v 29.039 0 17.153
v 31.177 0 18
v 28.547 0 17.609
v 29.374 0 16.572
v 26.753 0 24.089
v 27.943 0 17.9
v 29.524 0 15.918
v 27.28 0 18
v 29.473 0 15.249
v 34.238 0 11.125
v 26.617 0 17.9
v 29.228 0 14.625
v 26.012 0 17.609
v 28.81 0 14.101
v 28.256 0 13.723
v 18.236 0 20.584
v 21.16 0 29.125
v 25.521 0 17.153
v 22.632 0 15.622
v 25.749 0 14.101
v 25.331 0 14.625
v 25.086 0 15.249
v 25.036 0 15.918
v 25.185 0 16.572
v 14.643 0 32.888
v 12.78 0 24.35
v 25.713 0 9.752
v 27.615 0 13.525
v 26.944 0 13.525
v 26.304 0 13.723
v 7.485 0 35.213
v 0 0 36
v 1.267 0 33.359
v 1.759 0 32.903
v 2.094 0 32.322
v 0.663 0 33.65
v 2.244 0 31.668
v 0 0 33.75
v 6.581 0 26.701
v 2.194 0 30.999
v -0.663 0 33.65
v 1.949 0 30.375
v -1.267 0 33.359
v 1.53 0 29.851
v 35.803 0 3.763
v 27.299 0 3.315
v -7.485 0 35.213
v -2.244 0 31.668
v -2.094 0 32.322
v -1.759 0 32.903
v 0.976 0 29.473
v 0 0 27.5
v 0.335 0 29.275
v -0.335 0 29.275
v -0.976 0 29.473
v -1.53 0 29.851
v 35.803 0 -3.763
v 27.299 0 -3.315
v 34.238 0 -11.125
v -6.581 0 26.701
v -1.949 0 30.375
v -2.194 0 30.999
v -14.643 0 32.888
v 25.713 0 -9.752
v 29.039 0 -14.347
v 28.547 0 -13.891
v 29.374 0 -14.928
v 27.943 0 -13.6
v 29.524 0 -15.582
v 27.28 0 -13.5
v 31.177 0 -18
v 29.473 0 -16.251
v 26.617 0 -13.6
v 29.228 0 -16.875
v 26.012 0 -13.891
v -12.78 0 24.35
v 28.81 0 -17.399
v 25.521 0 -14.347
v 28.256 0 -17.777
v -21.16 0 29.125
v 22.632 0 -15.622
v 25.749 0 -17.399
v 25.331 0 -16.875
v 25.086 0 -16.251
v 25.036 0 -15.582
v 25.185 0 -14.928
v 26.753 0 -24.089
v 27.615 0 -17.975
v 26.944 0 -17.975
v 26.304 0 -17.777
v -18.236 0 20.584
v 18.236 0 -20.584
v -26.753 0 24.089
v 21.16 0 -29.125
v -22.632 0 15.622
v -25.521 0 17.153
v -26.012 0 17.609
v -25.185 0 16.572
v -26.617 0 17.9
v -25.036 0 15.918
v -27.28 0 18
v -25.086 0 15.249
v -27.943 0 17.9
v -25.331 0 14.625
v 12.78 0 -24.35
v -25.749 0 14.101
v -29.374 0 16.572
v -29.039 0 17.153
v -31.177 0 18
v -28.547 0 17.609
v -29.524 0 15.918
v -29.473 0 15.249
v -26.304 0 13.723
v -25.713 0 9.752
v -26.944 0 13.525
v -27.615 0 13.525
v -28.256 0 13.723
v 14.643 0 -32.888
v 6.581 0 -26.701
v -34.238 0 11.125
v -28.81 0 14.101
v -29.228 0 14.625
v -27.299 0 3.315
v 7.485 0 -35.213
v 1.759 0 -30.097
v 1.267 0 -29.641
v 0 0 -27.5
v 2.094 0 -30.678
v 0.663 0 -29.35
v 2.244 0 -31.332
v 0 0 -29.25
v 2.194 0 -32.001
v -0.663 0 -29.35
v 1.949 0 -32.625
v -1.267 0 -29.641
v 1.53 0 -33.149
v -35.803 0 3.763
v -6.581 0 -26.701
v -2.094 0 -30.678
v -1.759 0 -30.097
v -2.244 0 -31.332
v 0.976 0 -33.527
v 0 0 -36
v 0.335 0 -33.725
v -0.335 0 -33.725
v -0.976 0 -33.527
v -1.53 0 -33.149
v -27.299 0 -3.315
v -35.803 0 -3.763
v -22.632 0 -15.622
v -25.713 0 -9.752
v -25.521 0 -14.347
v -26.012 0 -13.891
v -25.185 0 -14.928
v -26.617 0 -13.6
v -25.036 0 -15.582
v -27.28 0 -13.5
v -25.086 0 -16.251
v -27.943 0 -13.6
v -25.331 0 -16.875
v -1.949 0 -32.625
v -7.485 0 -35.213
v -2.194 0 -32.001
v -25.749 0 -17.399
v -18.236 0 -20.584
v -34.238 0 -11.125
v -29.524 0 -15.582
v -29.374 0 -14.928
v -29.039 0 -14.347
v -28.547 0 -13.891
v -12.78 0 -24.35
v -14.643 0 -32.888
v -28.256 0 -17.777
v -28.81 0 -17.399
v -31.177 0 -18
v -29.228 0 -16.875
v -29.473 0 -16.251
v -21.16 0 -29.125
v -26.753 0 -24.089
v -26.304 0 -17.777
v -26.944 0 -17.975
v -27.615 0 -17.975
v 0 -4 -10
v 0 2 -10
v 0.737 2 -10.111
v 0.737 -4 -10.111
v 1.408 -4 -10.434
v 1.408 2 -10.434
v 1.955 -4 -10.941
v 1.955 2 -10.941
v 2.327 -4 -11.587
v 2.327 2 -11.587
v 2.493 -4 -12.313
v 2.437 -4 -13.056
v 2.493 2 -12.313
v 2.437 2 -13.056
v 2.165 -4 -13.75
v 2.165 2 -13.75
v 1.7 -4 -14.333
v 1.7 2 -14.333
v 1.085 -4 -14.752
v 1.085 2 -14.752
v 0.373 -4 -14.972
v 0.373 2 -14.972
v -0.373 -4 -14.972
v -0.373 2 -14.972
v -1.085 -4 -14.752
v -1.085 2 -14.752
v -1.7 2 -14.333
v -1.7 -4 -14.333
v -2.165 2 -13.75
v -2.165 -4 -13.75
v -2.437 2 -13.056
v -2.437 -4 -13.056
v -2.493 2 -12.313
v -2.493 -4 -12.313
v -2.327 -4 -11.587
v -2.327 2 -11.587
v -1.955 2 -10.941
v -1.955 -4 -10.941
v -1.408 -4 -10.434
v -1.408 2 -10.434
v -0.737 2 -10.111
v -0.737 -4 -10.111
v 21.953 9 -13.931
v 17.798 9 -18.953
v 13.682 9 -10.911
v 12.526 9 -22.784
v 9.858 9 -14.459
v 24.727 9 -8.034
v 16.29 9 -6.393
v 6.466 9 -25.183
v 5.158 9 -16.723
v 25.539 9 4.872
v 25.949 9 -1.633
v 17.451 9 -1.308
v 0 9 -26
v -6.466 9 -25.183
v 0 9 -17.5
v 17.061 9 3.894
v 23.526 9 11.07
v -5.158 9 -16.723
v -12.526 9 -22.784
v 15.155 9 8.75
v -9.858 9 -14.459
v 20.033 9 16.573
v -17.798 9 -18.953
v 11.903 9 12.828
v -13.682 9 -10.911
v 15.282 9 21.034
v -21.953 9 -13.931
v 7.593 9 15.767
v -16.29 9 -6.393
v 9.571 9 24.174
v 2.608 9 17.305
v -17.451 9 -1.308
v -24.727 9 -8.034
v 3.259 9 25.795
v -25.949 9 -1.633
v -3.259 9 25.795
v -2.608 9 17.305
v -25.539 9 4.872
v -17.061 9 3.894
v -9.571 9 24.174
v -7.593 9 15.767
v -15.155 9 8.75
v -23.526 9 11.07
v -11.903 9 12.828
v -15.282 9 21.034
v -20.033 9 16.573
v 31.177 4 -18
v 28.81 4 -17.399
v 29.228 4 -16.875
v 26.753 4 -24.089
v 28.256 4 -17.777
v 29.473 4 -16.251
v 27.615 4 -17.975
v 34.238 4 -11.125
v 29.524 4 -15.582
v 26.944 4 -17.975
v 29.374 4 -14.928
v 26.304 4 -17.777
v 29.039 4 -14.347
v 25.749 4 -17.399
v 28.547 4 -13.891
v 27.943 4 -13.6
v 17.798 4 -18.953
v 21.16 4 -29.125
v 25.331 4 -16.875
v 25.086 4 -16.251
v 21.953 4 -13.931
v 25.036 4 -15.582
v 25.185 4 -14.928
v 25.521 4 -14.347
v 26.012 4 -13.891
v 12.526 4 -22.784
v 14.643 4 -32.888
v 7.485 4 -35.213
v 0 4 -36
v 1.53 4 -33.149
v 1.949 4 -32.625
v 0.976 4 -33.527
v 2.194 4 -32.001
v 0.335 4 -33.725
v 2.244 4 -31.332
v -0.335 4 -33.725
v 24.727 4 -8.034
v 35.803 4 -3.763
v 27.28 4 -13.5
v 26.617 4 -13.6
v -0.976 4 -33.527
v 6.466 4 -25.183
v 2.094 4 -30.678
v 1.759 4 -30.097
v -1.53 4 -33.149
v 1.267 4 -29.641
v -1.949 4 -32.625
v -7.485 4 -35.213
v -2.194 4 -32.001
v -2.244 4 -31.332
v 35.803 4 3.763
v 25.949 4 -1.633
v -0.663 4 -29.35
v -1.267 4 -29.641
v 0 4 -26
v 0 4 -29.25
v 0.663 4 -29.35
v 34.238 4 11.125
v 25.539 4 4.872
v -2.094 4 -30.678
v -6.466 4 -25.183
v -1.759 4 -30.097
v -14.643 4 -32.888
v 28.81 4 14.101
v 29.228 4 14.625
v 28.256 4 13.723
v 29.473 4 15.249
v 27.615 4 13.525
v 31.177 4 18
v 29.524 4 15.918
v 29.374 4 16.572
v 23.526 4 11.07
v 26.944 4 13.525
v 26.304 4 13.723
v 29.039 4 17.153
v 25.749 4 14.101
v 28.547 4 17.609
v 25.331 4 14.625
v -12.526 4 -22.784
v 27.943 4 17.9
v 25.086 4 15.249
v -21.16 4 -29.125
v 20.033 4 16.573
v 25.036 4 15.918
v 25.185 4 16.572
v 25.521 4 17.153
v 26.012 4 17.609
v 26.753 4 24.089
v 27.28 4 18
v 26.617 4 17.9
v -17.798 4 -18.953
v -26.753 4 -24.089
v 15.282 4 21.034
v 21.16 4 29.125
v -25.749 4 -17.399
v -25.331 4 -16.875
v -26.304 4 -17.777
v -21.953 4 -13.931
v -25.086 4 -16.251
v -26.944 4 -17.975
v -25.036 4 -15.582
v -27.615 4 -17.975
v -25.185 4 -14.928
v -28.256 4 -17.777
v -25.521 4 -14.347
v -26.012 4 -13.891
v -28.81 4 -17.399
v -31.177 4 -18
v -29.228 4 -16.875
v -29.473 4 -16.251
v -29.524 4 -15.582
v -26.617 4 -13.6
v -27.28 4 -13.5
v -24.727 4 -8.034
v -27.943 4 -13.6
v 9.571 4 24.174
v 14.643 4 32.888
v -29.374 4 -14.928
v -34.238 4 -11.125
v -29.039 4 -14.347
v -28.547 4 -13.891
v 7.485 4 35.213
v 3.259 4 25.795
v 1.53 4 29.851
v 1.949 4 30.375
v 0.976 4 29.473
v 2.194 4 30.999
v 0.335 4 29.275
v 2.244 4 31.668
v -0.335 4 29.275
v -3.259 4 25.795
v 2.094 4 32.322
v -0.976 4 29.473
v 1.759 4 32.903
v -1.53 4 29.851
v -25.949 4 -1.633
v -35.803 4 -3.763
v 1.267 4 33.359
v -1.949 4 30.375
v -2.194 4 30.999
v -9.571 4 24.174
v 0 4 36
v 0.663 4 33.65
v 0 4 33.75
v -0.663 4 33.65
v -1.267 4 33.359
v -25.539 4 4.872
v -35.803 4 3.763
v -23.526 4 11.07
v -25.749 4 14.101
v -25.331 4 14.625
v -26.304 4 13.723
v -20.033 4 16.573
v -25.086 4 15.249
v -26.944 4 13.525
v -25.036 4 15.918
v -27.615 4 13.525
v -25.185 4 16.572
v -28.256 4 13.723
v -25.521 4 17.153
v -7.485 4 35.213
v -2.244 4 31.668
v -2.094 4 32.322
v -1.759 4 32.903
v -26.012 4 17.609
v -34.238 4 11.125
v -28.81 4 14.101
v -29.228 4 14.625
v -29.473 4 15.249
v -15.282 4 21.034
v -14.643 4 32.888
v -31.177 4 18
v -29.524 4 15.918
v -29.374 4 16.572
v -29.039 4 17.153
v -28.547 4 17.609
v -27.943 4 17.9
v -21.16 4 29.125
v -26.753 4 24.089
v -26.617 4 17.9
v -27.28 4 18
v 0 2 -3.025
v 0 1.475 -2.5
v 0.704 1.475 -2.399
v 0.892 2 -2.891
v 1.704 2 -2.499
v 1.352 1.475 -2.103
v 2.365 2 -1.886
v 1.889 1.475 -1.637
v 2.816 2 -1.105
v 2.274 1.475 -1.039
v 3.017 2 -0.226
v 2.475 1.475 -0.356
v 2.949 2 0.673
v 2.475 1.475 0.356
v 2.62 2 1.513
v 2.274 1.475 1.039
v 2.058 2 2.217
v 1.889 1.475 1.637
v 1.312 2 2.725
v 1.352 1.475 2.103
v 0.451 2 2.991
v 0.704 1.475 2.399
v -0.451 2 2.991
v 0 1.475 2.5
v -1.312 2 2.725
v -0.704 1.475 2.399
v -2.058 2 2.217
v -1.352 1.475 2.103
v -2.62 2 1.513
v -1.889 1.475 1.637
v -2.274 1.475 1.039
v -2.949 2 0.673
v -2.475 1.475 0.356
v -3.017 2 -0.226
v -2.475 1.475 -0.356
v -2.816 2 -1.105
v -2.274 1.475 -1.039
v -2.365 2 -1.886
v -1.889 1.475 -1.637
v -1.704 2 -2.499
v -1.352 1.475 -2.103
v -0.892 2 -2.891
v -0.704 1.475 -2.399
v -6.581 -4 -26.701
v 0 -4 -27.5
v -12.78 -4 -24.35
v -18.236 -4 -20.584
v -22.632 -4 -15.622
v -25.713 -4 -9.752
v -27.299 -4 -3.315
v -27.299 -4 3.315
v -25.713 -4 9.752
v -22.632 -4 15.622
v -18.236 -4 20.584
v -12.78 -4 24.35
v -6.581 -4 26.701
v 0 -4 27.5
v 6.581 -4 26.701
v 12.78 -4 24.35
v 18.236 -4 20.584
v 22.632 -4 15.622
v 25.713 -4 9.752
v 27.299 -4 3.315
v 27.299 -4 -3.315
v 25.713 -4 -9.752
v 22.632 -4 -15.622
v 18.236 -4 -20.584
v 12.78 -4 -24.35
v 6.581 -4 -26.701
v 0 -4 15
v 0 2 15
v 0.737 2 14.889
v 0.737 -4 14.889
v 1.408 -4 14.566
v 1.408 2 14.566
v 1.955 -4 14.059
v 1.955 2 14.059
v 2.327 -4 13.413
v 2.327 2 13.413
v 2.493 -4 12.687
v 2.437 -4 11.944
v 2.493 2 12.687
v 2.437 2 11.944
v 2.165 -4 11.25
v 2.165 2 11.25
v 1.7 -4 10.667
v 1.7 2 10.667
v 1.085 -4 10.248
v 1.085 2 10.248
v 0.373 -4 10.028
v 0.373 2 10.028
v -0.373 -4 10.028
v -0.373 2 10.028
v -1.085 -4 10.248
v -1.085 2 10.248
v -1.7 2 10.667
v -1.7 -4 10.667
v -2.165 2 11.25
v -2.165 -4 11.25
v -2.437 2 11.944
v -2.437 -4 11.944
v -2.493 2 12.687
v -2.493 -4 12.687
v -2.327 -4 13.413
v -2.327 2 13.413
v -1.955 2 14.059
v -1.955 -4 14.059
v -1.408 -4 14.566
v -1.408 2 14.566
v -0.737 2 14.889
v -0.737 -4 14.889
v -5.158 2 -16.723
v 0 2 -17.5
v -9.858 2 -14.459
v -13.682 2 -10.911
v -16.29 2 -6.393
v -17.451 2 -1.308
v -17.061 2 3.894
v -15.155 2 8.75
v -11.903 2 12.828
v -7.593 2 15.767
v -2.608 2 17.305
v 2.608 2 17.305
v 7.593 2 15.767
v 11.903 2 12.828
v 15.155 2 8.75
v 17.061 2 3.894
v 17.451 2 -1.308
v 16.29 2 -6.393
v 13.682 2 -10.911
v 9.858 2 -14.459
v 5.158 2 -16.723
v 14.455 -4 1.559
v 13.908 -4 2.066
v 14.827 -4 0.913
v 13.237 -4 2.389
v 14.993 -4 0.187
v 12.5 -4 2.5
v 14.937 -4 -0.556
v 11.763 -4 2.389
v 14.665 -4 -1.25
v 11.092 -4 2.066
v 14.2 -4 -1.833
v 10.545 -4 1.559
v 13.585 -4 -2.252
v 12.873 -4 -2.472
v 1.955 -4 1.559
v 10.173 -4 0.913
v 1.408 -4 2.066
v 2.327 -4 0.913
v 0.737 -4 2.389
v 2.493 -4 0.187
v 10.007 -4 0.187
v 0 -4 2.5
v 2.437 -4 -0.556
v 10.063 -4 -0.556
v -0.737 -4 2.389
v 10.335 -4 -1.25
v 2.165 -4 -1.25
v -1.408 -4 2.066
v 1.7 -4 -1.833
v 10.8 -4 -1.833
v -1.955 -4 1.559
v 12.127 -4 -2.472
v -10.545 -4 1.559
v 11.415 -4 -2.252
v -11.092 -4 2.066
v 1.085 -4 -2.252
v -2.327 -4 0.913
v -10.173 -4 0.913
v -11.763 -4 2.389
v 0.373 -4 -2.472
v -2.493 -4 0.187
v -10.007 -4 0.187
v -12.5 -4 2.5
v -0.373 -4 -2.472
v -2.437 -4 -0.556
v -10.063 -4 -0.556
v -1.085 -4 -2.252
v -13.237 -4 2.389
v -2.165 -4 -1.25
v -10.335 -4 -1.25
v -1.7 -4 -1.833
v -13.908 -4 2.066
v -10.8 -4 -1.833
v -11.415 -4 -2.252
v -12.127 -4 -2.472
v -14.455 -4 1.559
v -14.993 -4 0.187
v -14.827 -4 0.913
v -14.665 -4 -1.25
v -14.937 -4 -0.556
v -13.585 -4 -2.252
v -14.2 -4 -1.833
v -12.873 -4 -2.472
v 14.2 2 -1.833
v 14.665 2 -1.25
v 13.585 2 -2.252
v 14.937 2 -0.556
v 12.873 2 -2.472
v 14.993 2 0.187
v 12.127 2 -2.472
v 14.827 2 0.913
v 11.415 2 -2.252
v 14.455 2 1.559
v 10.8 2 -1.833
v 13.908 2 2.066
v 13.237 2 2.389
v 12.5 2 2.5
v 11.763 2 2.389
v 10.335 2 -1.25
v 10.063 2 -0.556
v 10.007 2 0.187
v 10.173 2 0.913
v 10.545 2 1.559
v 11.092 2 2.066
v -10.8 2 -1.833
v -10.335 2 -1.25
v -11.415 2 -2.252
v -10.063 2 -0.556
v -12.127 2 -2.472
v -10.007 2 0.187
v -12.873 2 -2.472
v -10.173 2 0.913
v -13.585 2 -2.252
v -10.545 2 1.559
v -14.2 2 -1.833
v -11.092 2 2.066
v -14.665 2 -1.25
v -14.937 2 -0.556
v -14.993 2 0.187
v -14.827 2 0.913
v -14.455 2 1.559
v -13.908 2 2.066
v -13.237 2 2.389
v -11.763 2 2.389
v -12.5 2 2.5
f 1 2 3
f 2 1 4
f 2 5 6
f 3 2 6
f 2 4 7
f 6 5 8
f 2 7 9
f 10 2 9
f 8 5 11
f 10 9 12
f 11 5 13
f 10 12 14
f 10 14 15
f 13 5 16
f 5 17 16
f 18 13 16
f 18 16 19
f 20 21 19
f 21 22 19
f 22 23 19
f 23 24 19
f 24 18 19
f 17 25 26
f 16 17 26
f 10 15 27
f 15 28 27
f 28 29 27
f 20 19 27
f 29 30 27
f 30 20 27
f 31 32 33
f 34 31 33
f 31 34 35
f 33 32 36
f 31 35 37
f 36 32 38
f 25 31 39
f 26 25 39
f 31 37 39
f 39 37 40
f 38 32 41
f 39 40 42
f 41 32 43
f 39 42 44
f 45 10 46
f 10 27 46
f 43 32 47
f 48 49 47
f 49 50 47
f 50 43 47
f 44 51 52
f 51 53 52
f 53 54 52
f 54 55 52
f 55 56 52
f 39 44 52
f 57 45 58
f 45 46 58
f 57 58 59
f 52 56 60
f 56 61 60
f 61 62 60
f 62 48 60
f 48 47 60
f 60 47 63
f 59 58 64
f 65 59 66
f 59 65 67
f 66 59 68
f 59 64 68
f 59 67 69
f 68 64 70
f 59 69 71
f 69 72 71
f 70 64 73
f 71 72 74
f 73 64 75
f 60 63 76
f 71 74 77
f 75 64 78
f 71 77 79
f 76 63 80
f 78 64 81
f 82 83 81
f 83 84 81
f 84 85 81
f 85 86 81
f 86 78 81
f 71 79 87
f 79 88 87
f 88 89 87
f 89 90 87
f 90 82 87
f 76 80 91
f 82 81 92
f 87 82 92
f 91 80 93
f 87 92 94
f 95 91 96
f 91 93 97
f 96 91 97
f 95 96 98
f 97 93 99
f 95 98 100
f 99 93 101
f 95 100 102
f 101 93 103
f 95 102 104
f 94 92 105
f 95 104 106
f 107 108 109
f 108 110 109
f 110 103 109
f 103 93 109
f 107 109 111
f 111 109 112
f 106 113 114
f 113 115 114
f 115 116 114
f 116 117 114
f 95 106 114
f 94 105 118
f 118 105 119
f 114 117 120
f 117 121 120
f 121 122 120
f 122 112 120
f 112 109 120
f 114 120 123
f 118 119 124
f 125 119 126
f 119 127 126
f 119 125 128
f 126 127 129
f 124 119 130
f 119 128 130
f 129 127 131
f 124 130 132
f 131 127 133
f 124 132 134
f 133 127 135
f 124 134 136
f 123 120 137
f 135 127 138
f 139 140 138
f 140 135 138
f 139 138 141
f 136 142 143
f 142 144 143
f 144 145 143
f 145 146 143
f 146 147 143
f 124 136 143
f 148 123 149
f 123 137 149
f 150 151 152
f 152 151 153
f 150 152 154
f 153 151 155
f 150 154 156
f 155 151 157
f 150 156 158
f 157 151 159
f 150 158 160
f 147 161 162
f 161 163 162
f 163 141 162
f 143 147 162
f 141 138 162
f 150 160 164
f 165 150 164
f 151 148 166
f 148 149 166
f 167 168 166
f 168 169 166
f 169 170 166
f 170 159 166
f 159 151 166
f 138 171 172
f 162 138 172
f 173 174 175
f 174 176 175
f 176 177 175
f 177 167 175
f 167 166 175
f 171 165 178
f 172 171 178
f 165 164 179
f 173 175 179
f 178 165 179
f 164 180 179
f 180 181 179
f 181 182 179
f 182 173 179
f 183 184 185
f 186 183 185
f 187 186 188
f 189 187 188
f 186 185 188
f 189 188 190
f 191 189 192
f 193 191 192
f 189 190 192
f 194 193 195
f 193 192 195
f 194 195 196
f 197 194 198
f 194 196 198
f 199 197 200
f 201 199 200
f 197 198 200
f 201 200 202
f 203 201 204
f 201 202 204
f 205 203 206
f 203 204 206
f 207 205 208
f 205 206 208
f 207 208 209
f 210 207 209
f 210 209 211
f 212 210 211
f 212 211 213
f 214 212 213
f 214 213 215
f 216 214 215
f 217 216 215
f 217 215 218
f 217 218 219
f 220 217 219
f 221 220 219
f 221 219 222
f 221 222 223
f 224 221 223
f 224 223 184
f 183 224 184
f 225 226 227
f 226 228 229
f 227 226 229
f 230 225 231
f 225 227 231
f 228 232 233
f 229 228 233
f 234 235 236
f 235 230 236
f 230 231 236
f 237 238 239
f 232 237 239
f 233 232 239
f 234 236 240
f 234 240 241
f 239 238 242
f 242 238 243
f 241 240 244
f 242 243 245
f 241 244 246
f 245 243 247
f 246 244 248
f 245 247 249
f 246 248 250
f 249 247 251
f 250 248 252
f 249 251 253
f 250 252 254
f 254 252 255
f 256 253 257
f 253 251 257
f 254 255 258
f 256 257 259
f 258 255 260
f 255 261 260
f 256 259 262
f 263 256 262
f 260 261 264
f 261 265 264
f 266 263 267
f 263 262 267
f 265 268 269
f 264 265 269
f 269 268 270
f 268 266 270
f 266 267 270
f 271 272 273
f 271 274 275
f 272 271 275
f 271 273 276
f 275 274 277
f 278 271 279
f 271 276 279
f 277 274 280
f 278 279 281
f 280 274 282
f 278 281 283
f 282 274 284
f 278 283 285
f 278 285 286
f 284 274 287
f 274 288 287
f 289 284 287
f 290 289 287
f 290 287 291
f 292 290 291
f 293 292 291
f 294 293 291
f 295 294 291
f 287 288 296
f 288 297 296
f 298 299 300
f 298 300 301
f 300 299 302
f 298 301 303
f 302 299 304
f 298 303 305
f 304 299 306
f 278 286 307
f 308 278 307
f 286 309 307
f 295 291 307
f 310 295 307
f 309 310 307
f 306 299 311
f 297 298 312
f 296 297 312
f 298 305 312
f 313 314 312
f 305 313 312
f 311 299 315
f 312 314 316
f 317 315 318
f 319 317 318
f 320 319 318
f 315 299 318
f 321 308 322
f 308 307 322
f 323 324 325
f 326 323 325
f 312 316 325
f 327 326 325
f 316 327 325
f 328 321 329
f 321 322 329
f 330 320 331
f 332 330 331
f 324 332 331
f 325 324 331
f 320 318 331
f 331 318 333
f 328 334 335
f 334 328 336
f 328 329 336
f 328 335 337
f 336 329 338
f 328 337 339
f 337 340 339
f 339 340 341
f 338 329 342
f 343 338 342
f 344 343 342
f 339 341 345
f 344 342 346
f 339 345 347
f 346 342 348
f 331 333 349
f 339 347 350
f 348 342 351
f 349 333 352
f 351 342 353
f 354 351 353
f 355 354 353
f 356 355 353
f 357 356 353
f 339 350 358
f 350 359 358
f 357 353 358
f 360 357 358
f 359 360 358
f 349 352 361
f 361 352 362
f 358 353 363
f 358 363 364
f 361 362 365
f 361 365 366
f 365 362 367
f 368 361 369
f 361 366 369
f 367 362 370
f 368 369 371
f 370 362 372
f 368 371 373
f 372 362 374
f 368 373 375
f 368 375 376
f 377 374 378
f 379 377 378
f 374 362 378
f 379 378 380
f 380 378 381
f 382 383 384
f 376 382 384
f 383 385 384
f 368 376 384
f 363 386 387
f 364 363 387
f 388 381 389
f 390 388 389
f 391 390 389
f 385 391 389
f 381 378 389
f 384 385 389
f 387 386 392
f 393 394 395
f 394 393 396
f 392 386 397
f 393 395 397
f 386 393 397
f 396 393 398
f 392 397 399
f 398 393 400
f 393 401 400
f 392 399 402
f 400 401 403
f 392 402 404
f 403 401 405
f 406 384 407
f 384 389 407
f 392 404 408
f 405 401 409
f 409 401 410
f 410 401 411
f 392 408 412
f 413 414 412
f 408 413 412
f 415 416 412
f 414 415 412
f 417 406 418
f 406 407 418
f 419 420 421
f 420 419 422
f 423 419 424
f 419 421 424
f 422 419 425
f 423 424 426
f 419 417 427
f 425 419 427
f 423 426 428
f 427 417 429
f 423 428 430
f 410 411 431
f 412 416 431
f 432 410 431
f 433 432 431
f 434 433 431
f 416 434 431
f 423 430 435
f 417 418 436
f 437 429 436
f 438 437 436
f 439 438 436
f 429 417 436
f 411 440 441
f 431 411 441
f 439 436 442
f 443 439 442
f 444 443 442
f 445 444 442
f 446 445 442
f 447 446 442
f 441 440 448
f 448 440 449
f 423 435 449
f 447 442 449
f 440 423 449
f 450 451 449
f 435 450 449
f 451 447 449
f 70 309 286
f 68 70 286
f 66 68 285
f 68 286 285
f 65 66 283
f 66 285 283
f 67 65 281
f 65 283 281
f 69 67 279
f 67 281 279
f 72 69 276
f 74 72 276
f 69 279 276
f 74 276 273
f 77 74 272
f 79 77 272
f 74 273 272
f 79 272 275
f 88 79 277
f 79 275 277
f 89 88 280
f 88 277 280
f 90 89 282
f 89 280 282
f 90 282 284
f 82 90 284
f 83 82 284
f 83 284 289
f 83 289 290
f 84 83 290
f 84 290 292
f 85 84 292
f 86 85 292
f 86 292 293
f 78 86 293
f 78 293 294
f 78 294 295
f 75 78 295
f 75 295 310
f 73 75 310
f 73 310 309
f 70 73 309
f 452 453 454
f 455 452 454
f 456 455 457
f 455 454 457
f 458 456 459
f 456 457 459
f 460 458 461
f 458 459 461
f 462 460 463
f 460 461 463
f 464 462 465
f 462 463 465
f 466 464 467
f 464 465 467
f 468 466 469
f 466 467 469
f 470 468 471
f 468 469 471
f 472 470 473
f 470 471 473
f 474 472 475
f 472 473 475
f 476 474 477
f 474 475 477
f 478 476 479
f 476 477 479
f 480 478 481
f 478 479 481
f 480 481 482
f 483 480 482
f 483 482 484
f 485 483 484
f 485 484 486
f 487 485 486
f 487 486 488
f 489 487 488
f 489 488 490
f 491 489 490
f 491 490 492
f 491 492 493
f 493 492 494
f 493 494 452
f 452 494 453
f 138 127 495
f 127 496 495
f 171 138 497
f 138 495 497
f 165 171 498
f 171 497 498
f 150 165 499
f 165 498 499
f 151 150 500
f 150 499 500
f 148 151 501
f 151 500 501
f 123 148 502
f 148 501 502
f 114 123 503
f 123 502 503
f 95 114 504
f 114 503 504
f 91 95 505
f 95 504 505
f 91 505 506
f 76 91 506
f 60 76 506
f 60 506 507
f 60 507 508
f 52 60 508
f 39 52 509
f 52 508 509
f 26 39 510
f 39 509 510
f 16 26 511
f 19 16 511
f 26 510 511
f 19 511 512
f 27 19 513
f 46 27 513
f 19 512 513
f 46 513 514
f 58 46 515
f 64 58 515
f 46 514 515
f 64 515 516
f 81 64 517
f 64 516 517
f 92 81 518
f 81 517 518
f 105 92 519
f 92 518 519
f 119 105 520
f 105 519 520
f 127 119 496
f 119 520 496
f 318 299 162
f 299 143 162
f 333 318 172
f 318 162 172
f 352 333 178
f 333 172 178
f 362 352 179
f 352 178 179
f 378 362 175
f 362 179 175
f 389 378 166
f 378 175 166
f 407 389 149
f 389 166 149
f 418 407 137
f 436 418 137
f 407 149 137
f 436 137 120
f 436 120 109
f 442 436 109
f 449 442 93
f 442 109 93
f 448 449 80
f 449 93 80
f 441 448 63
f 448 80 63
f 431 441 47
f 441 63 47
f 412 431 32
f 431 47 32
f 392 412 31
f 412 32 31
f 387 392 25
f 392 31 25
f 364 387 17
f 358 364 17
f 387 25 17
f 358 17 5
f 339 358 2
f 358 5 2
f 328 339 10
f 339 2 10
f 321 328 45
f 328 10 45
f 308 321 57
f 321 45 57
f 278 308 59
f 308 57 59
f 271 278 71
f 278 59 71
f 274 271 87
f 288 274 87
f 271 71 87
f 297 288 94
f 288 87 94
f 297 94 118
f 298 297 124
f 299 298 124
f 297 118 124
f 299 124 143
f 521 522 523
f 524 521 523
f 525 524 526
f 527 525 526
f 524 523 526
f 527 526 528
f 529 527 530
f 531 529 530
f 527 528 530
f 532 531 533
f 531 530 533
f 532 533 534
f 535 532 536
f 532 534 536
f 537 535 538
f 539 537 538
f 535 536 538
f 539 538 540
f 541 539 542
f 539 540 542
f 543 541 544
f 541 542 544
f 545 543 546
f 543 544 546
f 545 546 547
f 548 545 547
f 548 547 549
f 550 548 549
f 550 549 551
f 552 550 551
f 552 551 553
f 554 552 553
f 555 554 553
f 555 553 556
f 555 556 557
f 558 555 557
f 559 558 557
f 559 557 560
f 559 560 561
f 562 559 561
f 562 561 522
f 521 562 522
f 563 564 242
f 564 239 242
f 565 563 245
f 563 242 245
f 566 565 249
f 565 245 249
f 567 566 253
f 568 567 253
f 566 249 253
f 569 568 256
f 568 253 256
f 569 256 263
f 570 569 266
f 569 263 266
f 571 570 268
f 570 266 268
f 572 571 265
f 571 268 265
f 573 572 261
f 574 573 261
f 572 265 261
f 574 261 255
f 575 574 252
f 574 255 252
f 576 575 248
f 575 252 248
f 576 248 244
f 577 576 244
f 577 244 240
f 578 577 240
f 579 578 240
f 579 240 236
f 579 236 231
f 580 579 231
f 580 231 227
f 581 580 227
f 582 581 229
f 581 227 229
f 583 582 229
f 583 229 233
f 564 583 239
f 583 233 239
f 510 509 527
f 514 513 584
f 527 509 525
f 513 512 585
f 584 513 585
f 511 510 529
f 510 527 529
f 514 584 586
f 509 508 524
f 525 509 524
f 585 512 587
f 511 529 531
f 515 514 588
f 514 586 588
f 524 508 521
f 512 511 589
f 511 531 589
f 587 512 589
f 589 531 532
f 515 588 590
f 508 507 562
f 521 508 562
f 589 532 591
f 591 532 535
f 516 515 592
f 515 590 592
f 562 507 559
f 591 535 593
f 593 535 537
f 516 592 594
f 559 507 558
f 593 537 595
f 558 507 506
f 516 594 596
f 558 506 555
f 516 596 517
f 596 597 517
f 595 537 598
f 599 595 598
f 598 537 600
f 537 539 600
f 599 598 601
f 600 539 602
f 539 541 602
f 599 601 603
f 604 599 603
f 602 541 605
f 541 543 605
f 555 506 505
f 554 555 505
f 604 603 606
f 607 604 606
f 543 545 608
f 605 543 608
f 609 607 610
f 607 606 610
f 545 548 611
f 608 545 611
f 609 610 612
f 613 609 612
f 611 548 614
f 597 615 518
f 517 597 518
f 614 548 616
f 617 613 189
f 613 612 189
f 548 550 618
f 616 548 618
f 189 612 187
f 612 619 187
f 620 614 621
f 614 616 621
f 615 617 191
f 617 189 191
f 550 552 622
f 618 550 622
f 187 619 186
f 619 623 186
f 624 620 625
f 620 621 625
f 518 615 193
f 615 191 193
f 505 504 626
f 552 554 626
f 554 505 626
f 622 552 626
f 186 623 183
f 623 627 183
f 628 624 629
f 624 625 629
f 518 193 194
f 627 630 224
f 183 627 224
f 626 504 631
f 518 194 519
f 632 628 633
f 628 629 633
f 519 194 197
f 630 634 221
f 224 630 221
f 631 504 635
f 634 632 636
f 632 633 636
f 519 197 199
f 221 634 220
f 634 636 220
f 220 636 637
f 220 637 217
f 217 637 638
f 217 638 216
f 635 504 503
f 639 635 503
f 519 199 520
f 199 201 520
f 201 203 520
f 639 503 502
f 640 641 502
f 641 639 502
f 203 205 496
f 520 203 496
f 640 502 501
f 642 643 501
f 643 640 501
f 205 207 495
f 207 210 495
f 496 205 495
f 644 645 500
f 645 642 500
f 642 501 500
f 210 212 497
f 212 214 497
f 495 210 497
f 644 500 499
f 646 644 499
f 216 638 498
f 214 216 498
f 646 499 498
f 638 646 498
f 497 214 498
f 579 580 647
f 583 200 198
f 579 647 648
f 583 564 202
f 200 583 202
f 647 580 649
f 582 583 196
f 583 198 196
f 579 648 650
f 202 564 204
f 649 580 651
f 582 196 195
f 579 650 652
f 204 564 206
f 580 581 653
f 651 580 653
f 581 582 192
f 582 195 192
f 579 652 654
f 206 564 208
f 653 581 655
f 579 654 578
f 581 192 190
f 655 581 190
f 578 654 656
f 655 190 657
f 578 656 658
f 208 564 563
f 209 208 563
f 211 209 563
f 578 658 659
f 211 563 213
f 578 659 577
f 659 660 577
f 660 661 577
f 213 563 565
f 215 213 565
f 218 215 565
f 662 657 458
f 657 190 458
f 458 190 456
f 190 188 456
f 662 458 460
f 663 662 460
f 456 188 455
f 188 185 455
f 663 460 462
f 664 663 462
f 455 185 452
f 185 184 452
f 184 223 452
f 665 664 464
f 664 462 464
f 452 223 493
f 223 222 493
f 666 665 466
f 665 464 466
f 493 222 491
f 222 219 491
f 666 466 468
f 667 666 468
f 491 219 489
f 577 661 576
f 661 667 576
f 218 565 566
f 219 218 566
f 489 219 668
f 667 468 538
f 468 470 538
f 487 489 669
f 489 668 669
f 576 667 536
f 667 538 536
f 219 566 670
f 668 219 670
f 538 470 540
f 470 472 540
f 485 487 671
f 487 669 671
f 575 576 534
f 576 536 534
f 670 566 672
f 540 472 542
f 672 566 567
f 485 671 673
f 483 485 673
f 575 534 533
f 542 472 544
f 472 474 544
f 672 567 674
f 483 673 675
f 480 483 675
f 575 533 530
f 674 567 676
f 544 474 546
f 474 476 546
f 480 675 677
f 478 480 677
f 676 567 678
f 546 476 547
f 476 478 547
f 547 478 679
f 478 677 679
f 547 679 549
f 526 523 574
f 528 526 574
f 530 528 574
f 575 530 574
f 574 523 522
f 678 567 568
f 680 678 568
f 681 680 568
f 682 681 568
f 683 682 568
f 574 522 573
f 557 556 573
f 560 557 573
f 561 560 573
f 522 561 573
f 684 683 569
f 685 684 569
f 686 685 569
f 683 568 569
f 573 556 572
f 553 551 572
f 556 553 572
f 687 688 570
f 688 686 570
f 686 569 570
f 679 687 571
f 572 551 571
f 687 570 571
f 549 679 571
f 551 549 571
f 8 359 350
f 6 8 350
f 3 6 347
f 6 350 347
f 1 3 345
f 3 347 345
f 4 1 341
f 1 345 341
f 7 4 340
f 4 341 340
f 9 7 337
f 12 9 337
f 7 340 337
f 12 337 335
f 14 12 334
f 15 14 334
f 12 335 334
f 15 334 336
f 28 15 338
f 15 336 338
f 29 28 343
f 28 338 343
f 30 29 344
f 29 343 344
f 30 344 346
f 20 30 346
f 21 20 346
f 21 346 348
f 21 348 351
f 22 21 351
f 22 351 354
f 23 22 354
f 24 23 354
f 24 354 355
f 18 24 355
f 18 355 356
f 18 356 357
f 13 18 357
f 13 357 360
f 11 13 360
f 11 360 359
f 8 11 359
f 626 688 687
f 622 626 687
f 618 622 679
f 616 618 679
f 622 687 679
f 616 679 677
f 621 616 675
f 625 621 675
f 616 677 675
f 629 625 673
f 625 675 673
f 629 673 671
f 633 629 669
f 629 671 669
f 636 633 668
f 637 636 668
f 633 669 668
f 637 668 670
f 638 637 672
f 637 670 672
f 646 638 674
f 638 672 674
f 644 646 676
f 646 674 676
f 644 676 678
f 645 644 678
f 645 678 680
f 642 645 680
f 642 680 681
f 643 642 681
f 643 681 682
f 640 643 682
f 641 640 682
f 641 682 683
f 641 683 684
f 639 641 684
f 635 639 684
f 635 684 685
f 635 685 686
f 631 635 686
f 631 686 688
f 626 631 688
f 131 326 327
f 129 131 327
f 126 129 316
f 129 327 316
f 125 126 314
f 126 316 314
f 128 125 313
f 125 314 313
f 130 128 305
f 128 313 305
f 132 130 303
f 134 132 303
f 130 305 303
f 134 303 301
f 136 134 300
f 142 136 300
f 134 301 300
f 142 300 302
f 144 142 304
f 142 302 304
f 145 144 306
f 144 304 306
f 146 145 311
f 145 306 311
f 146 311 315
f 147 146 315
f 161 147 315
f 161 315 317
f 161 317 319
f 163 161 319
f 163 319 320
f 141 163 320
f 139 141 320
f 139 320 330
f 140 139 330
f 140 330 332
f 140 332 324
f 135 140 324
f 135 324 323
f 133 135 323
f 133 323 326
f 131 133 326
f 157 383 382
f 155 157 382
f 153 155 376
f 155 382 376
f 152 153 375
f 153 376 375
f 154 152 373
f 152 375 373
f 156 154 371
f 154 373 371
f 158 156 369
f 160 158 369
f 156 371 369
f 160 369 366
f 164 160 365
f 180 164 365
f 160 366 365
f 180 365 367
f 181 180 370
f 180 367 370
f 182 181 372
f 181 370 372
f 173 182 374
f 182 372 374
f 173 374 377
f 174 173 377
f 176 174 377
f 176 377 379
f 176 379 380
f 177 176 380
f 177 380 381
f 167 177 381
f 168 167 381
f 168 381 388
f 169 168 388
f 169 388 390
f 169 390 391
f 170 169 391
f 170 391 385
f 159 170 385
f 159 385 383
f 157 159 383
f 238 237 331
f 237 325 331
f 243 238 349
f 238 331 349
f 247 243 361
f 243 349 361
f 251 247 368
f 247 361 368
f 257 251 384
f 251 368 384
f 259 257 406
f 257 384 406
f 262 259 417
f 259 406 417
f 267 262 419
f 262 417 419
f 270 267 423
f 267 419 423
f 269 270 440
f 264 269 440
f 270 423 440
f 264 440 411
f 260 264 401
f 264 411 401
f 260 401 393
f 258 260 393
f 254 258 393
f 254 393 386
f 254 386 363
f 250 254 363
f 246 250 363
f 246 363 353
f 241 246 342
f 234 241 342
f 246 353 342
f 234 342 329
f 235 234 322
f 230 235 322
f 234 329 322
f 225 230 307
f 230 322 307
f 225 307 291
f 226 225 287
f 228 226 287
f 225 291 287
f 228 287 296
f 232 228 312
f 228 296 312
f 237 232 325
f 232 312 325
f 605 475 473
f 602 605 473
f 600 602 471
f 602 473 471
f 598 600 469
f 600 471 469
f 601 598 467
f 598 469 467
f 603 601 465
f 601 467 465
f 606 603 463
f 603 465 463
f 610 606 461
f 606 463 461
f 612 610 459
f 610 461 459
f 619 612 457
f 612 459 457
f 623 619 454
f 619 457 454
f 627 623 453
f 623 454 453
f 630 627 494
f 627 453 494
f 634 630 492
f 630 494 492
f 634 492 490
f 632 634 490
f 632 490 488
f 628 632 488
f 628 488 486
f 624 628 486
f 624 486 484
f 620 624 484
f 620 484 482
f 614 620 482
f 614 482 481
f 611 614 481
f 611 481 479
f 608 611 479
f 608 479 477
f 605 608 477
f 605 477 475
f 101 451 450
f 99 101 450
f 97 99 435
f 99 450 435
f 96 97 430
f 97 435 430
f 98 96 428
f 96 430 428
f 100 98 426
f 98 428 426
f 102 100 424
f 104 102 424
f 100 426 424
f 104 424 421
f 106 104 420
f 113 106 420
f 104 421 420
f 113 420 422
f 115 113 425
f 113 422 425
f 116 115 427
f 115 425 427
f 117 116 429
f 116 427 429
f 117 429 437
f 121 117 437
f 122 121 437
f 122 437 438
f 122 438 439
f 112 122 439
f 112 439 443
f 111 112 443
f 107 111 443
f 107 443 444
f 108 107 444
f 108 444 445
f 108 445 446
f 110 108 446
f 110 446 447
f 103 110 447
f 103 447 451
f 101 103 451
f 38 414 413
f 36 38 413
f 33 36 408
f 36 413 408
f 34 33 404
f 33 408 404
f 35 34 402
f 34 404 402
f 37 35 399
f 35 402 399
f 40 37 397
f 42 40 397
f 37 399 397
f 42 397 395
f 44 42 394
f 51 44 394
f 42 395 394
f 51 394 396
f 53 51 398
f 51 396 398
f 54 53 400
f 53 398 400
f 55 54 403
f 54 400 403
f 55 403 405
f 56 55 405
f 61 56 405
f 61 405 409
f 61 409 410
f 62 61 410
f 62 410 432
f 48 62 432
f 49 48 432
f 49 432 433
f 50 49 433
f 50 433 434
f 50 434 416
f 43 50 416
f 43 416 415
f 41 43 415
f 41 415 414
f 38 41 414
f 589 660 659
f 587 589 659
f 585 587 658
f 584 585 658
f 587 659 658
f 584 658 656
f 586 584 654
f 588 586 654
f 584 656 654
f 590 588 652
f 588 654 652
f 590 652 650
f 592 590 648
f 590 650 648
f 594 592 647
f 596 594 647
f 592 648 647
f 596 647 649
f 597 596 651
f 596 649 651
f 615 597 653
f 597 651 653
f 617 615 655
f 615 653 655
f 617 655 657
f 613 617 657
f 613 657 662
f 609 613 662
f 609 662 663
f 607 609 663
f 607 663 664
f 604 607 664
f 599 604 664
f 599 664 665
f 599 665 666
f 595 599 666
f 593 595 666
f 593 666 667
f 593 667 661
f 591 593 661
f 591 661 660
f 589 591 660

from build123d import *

# Parameters (mm, degrees)
SKETCH2_R                   = 2.25
CUT_EXTRUDE1_DEPTH          = 52.536394907
SKETCH4_R                   = 2.5
CUT_EXTRUDE3_DEPTH          = 10
M6_TAPPED_HOLE1_D           = 5
M6_TAPPED_HOLE1_DEPTH       = 15
M6_TAPPED_HOLE1_CSINK_D     = 6.05
M6_TAPPED_HOLE1_CSINK_ANGLE = 90
M6_TAPPED_HOLE1_TIP         = 1.502151548
SKETCH9_R                   = 2.5
CUT_EXTRUDE4_DEPTH          = 52.39066063
M6_TAPPED_HOLE2_D           = 5
M6_TAPPED_HOLE2_DEPTH       = 65
M6_TAPPED_HOLE2_CSINK_D     = 6.05
M6_TAPPED_HOLE2_CSINK_ANGLE = 90
M6_TAPPED_HOLE2_TIP         = 1.502151548


with BuildPart() as part:
    # Sketch1 → Revolve1 (revolve)
    with BuildSketch(Plane.XY, mode=Mode.PRIVATE) as revolve1_sk:
        Polygon((27.5, 0), (27.5, -4), (0, -4), (0, 2), (17.5, 2), (17.5, 9), (26, 9), (26, 4), (36, 4), (36, 0), align=None)
    revolve(revolve1_sk.sketch.rotate(Axis((0, 0, 0), (0, 1, 0)), 90), axis=Axis((0, 0, 0), (0, 1, 0)))

    # Sketch2 → Cut-Extrude1 (cut, through all)
    with BuildSketch(Plane(origin=(0, 4, 0), x_dir=(1, 0, 0), z_dir=(0, 1, 0))):
        with Locations(Location((0, 31.5, 0), (0, 0, 270))):
            Circle(SKETCH2_R)
        with Locations(Location((27.279800219, 15.75, 0), (0, 0, 270))):
            Circle(SKETCH2_R)
        with Locations(Location((27.279800219, -15.75, 0), (0, 0, 270))):
            Circle(SKETCH2_R)
        with Locations(Location((0, -31.5, 0), (0, 0, 270))):
            Circle(SKETCH2_R)
        with Locations(Location((-27.279800219, -15.75, 0), (0, 0, 270))):
            Circle(SKETCH2_R)
        with Locations(Location((-27.279800219, 15.75, 0), (0, 0, 270))):
            Circle(SKETCH2_R)
    extrude(amount=-CUT_EXTRUDE1_DEPTH, mode=Mode.SUBTRACT)

    # Sketch4 → Cut-Extrude3 (cut)
    with BuildSketch(Plane(origin=(0, 2, 0), x_dir=(1, 0, 0), z_dir=(0, 1, 0))):
        with Locations(Location((12.5, 0, 0), (0, 0, 270))):
            Circle(SKETCH4_R)
        with Locations(Location((0, -12.5, 0), (0, 0, 270))):
            Circle(SKETCH4_R)
        with Locations(Location((-12.5, 0, 0), (0, 0, 270))):
            Circle(SKETCH4_R)
        with Locations(Location((0, 12.5, 0), (0, 0, 270))):
            Circle(SKETCH4_R)
    extrude(amount=-CUT_EXTRUDE3_DEPTH, mode=Mode.SUBTRACT)

    # M6 Tapped Hole1
    with Locations(Plane(origin=(-12.5, 9, 0), x_dir=(0, 0, 1), z_dir=(0, 1, 0))):
        with Locations((0, 0), (0, 25), (-12.5, 12.5), (12.5, 12.5)):
            CounterSinkHole(M6_TAPPED_HOLE1_D / 2, M6_TAPPED_HOLE1_CSINK_D / 2, depth=M6_TAPPED_HOLE1_DEPTH, counter_sink_angle=M6_TAPPED_HOLE1_CSINK_ANGLE)
            with Locations((0, 0, -(M6_TAPPED_HOLE1_DEPTH + M6_TAPPED_HOLE1_TIP / 2))):  # 118° drill point
                Cone(0, M6_TAPPED_HOLE1_D / 2, M6_TAPPED_HOLE1_TIP, mode=Mode.SUBTRACT)

    # Sketch9 → Cut-Extrude4 (cut, through all)
    with BuildSketch(Plane(origin=(0, 2, 0), x_dir=(1, 0, 0), z_dir=(0, 1, 0))):
        with Locations(Location((0, 0, 0), (0, 0, 270))):
            Circle(SKETCH9_R)
    extrude(amount=-CUT_EXTRUDE4_DEPTH, mode=Mode.SUBTRACT)

    # M6 Tapped Hole2
    with Locations(Plane.ZX.offset(2)):
        with Locations((0, 0)):
            CounterSinkHole(M6_TAPPED_HOLE2_D / 2, M6_TAPPED_HOLE2_CSINK_D / 2, depth=M6_TAPPED_HOLE2_DEPTH, counter_sink_angle=M6_TAPPED_HOLE2_CSINK_ANGLE)
            with Locations((0, 0, -(M6_TAPPED_HOLE2_DEPTH + M6_TAPPED_HOLE2_TIP / 2))):  # 118° drill point
                Cone(0, M6_TAPPED_HOLE2_D / 2, M6_TAPPED_HOLE2_TIP, mode=Mode.SUBTRACT)


solid = part.part
